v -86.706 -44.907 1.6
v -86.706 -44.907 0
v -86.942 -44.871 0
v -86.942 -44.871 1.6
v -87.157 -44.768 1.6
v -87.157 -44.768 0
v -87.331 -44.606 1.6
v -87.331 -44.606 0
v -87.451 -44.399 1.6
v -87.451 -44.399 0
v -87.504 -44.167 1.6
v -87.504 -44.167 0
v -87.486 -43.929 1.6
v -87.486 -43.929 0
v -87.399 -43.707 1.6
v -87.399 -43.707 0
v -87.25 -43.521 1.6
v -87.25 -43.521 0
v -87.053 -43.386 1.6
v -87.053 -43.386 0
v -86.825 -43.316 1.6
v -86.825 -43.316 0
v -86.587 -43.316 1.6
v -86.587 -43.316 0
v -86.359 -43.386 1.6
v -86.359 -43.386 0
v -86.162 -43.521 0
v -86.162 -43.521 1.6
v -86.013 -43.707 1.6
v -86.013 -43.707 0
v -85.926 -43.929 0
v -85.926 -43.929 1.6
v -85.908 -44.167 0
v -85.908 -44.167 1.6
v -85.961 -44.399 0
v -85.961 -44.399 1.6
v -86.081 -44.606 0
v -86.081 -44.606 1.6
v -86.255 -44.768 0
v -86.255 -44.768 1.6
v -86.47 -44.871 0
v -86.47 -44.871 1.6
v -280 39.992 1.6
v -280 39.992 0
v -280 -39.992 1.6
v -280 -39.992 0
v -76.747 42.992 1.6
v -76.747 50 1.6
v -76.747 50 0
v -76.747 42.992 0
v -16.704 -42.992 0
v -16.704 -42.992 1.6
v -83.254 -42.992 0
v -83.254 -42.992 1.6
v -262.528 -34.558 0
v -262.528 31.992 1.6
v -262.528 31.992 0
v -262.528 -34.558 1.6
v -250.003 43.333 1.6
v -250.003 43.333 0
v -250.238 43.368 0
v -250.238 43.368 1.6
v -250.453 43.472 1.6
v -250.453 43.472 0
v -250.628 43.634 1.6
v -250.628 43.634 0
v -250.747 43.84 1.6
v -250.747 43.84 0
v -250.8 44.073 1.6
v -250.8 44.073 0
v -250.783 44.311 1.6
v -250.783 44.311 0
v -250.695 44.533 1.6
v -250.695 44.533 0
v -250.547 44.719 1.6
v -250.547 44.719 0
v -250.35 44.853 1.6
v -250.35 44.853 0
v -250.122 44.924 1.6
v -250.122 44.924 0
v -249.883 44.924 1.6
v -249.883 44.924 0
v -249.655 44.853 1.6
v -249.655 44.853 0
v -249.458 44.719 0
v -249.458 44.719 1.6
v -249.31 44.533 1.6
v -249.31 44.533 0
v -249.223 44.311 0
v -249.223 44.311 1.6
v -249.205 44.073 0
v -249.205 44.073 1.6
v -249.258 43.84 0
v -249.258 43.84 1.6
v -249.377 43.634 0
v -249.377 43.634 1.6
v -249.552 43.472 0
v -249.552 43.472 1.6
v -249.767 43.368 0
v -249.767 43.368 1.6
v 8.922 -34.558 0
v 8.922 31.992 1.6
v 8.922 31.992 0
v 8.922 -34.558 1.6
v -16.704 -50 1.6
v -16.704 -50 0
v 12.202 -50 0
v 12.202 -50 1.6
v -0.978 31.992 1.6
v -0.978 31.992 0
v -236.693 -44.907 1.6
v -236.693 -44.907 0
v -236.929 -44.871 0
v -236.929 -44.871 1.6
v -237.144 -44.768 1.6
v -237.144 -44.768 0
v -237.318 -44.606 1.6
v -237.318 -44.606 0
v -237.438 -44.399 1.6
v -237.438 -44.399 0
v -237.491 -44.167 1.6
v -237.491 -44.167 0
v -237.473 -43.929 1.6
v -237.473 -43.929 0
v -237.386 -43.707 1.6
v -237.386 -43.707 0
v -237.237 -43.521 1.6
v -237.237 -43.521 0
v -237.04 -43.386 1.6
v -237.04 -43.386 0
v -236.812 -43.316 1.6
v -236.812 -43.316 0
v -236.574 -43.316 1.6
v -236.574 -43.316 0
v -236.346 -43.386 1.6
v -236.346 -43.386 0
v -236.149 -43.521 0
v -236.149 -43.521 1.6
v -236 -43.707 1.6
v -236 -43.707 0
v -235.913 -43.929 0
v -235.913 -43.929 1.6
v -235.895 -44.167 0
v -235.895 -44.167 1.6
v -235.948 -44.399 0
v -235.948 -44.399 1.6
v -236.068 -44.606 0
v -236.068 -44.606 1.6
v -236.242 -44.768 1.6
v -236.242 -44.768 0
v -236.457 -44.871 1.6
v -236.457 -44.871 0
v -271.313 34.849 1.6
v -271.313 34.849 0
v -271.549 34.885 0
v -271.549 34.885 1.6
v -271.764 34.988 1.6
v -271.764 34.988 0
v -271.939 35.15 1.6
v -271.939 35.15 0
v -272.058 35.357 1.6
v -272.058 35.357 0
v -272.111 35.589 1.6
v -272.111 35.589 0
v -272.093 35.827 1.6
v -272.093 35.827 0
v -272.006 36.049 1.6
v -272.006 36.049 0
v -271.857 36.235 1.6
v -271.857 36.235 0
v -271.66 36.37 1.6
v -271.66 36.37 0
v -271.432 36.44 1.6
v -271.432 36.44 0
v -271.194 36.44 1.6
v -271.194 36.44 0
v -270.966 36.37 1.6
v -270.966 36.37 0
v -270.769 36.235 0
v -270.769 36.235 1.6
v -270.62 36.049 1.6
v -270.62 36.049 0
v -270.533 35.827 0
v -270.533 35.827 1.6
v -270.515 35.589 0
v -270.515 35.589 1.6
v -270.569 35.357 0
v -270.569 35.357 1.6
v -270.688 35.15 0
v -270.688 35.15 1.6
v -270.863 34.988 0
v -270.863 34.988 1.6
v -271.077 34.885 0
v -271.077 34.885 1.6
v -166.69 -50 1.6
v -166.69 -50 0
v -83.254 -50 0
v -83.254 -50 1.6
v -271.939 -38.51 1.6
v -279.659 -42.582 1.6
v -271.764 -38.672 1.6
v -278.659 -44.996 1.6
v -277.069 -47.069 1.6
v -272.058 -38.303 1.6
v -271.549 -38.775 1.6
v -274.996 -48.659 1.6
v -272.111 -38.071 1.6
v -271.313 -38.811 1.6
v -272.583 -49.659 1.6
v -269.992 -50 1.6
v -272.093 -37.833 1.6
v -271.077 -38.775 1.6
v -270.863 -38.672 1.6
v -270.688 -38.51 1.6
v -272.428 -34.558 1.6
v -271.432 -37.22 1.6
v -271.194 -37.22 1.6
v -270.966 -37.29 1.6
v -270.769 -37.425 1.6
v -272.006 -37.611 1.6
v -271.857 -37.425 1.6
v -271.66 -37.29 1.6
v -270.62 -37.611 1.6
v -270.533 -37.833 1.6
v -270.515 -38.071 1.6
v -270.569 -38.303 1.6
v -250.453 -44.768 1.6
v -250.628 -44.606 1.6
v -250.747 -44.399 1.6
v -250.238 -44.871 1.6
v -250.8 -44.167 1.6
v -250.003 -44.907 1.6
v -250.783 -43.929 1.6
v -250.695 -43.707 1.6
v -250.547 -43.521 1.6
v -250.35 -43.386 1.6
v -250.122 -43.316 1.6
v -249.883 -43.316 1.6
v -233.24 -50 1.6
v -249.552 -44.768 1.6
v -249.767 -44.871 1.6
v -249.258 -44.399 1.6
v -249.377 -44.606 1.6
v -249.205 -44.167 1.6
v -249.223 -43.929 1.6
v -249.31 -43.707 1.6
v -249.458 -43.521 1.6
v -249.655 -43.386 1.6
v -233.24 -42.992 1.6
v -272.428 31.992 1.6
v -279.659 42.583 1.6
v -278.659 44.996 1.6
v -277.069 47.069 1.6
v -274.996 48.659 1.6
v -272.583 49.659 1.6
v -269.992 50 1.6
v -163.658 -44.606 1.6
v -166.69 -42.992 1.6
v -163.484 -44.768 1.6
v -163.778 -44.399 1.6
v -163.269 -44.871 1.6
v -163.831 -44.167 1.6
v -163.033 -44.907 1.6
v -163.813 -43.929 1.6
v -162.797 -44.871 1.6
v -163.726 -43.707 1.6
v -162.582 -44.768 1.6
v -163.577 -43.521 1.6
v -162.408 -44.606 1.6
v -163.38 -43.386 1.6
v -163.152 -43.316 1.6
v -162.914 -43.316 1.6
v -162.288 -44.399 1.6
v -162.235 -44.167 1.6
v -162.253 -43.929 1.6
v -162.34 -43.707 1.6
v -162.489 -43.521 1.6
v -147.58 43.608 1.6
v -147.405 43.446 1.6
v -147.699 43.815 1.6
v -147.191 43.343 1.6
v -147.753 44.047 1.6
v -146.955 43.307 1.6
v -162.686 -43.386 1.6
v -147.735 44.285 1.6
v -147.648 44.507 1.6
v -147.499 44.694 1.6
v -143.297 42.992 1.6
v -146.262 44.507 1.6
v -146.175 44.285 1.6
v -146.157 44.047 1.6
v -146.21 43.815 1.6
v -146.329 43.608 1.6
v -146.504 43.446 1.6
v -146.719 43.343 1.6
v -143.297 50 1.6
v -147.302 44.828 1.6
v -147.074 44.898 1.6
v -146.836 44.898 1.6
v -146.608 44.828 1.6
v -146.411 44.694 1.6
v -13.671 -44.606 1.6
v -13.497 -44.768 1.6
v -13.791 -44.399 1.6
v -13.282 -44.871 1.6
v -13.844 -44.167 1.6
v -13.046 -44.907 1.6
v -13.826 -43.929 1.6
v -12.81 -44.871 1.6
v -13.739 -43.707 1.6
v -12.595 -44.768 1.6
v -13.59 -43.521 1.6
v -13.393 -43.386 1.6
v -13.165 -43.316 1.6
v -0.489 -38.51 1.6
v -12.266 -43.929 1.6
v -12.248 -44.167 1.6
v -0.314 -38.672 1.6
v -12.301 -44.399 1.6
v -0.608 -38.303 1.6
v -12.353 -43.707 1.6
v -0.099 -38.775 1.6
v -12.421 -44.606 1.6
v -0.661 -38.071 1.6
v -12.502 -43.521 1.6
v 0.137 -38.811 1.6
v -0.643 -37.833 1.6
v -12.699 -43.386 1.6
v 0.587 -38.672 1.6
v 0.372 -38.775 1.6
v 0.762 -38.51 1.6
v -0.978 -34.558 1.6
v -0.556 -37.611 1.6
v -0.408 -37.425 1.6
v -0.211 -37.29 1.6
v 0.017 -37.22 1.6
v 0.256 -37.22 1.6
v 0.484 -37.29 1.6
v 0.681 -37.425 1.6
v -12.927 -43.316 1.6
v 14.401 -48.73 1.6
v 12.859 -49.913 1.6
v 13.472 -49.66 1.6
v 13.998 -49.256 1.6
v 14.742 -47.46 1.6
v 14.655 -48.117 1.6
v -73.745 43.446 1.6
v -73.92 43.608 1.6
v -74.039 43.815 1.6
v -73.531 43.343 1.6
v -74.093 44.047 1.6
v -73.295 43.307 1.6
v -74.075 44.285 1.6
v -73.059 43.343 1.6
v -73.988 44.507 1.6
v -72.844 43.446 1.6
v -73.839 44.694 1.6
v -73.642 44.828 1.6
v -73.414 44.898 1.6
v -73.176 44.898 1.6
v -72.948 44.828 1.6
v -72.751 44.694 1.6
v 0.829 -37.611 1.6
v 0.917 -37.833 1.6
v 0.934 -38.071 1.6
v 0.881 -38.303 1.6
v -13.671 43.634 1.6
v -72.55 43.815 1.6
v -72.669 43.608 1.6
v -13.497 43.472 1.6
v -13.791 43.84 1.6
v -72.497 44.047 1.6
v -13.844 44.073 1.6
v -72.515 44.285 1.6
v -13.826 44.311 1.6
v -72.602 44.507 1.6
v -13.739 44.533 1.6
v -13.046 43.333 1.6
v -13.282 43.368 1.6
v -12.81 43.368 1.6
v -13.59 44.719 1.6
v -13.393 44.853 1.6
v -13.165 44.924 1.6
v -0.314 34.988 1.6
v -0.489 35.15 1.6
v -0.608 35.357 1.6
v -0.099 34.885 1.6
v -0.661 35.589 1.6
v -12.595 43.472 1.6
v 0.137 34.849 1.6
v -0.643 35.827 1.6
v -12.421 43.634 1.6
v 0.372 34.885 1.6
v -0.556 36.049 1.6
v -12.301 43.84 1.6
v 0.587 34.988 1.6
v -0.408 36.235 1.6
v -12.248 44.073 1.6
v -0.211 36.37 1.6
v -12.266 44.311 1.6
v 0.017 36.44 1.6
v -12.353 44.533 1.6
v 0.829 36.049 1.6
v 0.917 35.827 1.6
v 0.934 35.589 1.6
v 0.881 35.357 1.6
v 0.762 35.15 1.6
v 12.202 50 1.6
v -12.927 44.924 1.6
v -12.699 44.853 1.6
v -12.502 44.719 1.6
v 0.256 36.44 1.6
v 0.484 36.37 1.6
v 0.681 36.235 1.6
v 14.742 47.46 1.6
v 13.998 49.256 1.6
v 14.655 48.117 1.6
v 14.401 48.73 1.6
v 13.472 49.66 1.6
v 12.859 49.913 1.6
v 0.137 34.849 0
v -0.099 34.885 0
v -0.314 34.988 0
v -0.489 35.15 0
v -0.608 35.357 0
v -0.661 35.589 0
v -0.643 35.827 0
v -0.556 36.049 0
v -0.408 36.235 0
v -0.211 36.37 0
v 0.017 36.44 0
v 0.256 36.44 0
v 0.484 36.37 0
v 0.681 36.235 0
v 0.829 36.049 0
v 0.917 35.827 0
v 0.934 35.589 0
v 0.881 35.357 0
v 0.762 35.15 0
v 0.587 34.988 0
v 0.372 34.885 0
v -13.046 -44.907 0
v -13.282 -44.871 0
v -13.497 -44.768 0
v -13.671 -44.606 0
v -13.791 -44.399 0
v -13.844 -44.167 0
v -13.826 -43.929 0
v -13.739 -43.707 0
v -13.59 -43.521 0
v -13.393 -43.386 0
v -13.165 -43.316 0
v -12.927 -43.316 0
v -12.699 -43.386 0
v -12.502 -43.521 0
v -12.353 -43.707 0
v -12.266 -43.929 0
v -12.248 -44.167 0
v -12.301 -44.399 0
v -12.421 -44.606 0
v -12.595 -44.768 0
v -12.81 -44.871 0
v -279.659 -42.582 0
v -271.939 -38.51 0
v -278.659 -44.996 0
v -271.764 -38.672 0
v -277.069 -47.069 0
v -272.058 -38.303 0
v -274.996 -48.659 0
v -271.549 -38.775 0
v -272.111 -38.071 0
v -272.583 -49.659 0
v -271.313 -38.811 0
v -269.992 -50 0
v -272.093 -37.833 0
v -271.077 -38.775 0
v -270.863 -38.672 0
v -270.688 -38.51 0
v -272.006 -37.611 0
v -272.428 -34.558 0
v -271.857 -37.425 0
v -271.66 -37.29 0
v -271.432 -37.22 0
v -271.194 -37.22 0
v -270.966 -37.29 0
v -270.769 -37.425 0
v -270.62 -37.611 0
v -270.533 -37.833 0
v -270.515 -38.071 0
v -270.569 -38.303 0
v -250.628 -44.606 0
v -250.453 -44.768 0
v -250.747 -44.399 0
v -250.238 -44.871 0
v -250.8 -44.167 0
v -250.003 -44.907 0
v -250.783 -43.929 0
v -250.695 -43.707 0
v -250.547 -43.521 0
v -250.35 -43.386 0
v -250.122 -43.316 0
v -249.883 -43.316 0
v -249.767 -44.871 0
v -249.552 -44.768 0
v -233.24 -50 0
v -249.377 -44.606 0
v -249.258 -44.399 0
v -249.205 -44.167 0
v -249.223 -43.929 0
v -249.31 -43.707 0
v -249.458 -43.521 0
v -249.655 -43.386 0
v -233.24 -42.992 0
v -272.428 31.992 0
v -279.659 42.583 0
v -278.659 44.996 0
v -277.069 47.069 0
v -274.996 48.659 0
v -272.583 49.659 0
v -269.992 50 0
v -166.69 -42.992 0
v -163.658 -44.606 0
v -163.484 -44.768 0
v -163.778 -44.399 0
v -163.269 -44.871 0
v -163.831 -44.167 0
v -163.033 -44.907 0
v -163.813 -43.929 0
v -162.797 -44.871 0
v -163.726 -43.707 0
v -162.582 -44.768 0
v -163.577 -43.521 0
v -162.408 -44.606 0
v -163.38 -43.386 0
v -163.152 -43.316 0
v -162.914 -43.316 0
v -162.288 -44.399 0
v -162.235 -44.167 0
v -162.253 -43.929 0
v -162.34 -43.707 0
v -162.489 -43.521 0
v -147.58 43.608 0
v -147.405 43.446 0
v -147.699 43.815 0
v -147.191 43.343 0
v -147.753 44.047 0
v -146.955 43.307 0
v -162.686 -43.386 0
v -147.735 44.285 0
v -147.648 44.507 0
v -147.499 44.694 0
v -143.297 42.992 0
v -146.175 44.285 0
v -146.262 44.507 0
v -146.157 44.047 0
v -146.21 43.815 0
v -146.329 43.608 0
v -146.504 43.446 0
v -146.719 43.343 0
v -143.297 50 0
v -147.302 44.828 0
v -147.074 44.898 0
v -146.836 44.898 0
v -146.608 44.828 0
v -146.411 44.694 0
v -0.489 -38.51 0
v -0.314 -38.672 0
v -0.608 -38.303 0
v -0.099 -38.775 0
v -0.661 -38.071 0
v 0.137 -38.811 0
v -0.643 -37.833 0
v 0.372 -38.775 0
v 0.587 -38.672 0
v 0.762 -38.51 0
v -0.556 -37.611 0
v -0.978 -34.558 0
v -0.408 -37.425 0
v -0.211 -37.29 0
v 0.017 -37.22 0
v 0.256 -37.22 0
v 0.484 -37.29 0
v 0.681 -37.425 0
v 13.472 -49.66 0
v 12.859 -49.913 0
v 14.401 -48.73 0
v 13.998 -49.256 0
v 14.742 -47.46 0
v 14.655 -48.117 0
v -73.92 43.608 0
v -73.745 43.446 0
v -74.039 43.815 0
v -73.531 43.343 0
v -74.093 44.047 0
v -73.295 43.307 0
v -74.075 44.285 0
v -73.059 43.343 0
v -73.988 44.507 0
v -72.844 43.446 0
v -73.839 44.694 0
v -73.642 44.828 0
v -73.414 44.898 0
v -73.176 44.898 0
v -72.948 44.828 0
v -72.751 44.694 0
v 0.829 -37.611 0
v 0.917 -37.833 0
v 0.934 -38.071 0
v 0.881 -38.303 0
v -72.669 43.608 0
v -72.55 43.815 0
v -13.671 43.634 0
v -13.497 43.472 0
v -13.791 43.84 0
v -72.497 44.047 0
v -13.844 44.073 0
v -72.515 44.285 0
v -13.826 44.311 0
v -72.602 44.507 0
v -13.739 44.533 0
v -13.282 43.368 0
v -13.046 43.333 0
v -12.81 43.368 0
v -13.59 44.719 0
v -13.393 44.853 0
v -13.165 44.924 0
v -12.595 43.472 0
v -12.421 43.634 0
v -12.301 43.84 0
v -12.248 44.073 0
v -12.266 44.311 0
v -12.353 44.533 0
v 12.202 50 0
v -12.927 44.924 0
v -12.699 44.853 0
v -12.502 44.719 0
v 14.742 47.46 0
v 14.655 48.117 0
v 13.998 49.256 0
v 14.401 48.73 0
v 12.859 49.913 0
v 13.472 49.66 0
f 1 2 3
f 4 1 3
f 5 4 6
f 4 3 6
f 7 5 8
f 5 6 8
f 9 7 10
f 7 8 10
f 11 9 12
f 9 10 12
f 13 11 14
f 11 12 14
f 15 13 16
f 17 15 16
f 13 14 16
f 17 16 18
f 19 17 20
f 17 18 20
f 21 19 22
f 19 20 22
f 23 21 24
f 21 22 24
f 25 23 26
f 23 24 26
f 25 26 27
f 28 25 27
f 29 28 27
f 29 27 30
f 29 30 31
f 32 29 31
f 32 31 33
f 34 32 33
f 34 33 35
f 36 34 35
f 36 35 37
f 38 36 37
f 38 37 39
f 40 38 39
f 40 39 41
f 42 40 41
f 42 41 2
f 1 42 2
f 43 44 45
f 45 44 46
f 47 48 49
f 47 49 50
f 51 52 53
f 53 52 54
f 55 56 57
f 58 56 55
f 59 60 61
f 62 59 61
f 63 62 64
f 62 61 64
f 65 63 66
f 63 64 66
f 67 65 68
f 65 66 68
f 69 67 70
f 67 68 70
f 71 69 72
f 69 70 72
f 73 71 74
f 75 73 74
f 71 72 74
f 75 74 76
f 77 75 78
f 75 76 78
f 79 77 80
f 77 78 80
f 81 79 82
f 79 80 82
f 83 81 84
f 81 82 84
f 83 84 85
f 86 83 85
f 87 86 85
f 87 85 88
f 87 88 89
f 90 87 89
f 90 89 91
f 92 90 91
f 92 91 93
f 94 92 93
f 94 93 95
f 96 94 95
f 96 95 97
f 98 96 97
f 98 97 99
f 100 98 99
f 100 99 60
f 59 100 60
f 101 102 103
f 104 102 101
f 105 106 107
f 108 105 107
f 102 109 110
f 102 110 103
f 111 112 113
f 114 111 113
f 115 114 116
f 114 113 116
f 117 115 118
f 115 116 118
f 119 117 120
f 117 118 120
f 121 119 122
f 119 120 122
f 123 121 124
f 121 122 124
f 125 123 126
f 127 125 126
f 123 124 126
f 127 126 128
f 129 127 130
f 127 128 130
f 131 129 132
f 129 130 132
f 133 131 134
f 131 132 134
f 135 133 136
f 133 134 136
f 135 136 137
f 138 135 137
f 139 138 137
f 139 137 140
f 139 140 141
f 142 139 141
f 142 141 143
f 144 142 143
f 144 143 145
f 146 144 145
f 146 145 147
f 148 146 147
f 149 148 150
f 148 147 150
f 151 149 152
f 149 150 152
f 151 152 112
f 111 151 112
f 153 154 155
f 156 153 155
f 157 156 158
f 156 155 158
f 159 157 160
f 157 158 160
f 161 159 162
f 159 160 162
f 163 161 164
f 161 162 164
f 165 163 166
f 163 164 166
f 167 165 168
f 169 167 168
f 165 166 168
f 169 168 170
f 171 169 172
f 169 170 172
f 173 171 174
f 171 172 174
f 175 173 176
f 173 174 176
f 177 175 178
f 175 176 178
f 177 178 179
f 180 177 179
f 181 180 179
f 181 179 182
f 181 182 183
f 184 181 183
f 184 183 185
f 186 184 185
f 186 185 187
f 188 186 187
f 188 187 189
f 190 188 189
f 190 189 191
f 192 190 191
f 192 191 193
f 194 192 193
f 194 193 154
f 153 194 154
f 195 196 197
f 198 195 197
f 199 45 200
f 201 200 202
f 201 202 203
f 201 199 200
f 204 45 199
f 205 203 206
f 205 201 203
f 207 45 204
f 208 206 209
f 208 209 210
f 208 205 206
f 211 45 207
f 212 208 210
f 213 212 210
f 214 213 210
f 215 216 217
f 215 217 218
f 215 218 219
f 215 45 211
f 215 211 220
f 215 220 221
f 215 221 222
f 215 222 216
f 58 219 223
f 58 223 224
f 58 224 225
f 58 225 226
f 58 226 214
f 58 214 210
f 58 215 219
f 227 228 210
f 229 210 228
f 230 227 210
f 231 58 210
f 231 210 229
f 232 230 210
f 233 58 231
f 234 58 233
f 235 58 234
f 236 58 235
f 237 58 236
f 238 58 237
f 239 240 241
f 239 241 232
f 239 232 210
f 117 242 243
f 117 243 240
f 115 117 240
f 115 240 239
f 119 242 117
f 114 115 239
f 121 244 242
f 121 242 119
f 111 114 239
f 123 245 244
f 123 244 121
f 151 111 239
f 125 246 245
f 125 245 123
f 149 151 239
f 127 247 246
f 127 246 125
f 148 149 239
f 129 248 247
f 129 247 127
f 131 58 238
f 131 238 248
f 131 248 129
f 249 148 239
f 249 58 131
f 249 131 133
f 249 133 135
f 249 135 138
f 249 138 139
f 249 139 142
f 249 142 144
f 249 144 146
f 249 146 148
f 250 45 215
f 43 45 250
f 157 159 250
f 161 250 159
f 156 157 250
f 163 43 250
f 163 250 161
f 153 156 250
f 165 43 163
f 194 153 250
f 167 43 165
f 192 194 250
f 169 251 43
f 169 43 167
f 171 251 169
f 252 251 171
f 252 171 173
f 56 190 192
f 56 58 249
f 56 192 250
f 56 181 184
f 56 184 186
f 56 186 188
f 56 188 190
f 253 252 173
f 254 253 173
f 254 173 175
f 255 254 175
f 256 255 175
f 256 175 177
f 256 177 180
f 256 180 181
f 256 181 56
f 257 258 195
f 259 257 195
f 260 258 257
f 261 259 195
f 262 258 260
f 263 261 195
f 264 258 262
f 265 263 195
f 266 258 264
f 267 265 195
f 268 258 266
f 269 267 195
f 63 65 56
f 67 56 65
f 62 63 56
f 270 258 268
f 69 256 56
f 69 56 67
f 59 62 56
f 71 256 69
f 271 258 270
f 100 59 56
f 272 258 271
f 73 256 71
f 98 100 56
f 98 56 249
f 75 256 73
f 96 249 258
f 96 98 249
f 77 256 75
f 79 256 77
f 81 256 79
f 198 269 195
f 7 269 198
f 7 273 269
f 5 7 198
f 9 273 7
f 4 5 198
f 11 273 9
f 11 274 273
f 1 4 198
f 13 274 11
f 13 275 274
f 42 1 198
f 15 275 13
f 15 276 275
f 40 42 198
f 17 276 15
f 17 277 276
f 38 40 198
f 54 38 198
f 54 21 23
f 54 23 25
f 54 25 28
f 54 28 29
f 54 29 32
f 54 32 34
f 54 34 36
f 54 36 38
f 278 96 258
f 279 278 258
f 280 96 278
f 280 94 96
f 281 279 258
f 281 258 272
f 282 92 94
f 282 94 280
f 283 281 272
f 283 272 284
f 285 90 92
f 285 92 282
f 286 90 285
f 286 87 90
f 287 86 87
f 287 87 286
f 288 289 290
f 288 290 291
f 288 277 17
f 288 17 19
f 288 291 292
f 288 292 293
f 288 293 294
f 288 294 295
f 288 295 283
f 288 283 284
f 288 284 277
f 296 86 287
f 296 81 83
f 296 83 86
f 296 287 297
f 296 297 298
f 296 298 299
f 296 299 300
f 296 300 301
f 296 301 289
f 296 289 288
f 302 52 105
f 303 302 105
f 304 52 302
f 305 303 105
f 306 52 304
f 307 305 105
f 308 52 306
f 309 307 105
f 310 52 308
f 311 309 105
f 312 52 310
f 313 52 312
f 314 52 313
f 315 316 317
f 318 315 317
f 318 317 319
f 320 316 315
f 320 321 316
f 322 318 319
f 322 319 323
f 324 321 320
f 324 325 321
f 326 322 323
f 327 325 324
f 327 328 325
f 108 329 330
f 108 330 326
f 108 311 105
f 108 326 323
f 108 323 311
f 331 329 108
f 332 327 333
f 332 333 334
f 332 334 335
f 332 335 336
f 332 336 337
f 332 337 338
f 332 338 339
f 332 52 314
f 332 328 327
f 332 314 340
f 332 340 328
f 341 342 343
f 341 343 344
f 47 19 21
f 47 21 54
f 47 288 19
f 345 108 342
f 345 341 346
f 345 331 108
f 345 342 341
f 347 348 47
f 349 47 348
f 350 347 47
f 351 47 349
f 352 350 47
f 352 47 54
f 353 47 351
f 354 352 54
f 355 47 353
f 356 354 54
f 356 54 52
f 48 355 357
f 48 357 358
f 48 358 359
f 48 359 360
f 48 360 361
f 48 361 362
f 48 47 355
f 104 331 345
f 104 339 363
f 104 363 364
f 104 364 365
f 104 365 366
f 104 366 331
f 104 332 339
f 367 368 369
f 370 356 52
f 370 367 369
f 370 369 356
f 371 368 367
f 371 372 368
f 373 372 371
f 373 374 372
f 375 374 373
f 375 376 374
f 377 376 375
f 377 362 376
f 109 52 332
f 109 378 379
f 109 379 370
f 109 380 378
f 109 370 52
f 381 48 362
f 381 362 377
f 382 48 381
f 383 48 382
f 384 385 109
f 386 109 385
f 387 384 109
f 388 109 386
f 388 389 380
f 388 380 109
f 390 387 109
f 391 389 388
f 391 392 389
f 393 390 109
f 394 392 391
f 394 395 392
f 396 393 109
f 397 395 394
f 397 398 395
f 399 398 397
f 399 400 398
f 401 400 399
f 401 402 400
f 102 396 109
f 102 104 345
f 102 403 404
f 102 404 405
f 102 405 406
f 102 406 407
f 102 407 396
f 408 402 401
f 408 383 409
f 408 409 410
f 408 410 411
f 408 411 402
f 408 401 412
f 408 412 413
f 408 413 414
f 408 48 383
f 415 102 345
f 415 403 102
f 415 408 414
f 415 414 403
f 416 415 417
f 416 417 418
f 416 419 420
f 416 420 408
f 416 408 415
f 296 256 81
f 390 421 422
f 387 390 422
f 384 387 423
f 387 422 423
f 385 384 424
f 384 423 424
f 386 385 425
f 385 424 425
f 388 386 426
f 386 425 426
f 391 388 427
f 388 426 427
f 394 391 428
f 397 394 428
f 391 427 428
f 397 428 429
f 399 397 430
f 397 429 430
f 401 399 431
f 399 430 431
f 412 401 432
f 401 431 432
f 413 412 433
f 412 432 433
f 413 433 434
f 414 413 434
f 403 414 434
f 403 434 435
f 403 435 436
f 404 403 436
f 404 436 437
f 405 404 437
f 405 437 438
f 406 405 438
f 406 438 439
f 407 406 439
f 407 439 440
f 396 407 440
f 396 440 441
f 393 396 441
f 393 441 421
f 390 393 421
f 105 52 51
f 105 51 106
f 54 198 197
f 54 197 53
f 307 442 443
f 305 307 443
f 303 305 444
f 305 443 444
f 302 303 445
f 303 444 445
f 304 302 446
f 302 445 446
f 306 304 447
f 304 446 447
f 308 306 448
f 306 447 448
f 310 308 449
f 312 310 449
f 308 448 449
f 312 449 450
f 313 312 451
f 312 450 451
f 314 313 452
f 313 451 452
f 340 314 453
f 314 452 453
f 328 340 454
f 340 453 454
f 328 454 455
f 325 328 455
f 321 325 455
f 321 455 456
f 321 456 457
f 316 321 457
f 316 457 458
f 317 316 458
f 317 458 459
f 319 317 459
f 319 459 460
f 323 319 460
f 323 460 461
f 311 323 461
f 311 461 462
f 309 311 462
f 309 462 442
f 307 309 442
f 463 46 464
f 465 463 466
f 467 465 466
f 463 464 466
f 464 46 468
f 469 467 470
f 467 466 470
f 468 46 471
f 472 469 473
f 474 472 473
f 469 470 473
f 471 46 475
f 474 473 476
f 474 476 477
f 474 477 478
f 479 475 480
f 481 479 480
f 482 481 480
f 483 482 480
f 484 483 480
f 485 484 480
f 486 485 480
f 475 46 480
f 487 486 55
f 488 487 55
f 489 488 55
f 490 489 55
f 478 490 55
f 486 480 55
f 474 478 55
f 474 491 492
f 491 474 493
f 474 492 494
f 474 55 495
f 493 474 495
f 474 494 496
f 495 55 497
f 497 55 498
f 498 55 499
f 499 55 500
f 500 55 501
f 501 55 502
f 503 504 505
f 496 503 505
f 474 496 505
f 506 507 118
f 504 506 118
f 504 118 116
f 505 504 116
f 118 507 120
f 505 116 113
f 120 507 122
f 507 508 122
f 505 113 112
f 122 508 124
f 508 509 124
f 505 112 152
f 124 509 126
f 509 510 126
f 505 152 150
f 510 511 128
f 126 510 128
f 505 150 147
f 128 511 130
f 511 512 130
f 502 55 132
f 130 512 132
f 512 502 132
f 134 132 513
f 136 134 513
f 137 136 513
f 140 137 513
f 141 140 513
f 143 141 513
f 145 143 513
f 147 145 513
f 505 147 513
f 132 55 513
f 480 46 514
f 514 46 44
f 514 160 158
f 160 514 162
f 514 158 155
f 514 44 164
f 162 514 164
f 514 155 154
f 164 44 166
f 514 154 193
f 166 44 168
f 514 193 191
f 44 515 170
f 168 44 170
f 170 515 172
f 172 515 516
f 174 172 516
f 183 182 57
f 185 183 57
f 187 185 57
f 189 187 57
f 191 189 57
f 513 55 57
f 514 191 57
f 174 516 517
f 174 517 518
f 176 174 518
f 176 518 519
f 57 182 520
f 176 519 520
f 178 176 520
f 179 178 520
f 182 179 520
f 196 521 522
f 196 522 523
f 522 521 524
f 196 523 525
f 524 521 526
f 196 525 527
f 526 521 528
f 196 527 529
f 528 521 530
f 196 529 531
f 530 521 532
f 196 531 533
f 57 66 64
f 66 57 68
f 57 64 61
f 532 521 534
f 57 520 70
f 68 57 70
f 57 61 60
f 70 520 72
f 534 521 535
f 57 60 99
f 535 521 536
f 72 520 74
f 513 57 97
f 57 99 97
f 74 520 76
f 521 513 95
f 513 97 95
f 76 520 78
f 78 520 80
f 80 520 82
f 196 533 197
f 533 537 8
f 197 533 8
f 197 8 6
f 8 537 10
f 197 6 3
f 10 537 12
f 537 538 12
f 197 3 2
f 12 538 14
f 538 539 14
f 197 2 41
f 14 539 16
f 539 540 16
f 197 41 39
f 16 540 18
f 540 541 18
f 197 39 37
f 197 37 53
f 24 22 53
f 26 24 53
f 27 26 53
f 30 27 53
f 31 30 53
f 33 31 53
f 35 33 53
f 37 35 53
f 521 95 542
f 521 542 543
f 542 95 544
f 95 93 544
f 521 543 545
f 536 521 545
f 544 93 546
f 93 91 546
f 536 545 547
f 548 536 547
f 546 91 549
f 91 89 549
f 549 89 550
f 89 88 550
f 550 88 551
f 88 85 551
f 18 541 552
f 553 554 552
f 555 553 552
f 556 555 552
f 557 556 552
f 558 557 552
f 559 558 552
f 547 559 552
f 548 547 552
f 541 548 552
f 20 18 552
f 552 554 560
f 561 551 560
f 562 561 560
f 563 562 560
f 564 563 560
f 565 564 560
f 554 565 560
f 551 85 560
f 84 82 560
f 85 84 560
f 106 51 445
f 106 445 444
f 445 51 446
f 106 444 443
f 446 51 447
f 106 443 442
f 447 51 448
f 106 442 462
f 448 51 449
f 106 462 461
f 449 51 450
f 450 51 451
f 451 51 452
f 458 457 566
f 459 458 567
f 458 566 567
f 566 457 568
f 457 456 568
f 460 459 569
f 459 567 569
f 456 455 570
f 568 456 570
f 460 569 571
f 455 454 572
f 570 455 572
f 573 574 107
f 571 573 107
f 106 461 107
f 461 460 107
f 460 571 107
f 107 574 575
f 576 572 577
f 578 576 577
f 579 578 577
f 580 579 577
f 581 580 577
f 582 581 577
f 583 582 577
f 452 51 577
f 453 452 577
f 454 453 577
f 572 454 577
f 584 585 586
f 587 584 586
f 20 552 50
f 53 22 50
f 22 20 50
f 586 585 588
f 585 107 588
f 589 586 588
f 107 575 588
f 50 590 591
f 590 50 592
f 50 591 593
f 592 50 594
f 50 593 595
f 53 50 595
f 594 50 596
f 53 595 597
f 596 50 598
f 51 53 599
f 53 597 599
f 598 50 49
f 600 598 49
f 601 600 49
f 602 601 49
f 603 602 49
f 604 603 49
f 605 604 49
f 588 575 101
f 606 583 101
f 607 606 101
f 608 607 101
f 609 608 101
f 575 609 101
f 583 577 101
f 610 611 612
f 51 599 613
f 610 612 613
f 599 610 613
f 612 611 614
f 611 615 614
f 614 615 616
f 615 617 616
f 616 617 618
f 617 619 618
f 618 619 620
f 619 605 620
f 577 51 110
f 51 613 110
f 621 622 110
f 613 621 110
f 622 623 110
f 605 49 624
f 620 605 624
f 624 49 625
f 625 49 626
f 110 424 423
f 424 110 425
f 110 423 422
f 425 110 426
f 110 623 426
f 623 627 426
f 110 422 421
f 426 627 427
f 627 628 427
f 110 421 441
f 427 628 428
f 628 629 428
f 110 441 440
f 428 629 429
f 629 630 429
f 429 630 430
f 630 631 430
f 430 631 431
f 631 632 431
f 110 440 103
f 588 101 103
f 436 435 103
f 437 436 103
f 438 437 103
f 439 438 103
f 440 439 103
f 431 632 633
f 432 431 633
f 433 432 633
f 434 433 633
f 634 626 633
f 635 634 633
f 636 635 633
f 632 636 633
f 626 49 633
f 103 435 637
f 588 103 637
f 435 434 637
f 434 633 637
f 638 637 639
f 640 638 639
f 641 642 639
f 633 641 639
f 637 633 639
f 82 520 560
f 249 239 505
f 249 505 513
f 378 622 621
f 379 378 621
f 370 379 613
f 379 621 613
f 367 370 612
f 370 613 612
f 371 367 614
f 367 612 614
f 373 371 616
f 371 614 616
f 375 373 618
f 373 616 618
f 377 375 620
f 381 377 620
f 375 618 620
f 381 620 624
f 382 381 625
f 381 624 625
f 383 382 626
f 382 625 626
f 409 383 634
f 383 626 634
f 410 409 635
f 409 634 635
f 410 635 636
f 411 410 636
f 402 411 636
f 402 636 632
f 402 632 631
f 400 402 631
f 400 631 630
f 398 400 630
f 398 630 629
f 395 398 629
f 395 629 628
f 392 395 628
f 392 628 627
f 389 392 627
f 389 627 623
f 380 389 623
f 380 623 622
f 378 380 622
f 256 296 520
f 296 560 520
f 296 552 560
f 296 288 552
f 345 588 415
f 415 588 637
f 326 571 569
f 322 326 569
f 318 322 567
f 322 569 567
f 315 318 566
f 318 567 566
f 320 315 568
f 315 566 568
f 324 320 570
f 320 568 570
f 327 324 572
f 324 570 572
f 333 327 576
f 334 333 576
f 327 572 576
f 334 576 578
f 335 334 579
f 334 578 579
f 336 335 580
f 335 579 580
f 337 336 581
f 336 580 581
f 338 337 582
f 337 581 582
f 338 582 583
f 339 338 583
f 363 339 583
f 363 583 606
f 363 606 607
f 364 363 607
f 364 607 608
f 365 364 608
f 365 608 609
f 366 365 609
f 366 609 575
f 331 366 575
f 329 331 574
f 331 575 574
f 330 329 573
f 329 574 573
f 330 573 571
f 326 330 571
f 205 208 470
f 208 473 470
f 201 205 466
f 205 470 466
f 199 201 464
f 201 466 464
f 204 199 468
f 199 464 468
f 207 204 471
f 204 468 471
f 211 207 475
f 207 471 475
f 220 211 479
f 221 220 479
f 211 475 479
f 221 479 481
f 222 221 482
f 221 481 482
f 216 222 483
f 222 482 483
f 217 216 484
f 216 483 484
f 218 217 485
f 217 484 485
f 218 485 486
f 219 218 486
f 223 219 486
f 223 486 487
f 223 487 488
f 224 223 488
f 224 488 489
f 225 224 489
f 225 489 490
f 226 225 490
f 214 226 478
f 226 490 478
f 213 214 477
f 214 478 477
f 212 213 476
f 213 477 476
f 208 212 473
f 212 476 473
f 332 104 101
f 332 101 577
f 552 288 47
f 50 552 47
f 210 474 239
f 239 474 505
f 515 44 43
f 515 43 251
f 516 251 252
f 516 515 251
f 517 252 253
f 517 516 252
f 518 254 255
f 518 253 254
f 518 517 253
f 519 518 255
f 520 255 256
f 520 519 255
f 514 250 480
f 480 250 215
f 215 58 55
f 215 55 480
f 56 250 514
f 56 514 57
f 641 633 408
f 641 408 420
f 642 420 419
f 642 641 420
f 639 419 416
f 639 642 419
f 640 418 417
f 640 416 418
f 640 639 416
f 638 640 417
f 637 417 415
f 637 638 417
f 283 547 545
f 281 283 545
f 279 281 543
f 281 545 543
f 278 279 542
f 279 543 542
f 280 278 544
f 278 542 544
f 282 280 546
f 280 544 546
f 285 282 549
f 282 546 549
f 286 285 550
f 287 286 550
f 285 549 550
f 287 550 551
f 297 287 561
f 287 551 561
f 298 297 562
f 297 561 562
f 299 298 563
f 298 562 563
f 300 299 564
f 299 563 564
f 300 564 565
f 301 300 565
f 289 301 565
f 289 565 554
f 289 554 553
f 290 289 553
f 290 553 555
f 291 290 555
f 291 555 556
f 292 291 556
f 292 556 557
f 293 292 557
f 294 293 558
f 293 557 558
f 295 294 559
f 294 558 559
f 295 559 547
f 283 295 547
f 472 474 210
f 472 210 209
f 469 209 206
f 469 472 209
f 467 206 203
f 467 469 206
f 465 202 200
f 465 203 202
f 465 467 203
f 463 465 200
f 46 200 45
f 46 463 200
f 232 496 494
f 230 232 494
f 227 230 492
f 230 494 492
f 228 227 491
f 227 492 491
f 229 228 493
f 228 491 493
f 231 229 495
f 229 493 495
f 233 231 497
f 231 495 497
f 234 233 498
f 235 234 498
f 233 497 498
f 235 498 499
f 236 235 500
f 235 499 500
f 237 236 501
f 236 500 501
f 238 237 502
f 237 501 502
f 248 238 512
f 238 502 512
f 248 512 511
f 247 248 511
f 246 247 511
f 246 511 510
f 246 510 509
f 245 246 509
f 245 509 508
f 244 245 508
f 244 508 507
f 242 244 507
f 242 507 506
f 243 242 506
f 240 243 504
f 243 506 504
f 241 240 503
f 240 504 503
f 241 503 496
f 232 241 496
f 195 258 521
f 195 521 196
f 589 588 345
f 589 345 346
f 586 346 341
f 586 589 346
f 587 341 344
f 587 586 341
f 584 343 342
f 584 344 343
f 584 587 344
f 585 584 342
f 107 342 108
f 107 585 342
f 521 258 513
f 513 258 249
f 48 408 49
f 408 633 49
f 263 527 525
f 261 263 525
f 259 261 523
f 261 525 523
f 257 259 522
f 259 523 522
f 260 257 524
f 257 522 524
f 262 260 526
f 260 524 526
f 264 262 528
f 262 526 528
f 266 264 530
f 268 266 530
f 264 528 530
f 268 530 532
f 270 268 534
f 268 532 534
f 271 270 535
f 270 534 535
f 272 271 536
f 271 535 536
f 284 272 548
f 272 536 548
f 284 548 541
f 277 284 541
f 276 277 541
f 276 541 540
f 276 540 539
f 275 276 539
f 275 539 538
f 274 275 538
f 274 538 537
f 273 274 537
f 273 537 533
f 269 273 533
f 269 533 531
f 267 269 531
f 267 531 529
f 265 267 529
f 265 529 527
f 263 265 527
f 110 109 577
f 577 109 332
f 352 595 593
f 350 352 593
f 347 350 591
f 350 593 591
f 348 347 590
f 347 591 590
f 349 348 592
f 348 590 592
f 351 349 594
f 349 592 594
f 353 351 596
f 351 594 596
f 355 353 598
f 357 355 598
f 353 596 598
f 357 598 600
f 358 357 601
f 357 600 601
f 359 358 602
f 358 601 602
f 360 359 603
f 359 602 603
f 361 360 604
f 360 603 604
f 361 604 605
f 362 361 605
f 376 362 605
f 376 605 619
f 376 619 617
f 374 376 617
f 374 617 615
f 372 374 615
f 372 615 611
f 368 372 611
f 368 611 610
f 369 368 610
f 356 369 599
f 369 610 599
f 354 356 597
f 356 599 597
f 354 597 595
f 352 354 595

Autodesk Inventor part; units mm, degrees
ref_plane "YZ Plane" through (0, 0, 0) normal (1, 0, 0) x (0, 1, 0)
ref_plane "XZ Plane" through (0, 0, 0) normal (0, 1, 0) x (-1, 0, 0)
ref_plane "XY Plane" through (0, 0, 0) normal (0, 0, 1) x (1, 0, 0)
ref_plane "Work Plane1" through (0, 0, 0) normal (0, 0, 1) x (1, 0, 0)
sketch "Sketch1" plane through (0, 0, 0) normal (0, 0, 1) x (1, 0, 0)
  line L0 (14.7416, 30.2896) -> (14.7416, 47.46) projected
  line L1 (14.7416, 29.7816) -> (14.7416, 30.2896) projected
  line L2 (14.7416, -47.4598) -> (14.7416, 29.7816) projected
  arc A0 (14.7416, 47.46) -> (12.2016, 50) centre (12.2016, 47.46) ccw projected
  line L3 (12.2016, 50) -> (-68.0116, 50) projected
  arc A1 (12.2016, -49.9998) -> (14.7416, -47.4598) centre (12.2016, -47.4598) ccw projected
  line L4 (-6.315, -49.9998) -> (12.2016, -49.9998) projected
  line L5 (-157.7498, -49.9998) -> (-92.5988, -49.9998) projected
  line L6 (-269.9924, -49.9998) -> (-263.9218, -49.9998) projected
  line L7 (-263.9218, -49.9998) -> (-241.9762, -49.9998) projected
  arc A2 (-280, -39.9922) -> (-269.9924, -49.9998) centre (-269.9924, -39.9922) ccw projected
  line L8 (-280, 39.2304) -> (-280, -39.9922) projected
  arc A3 (-269.9924, 50) -> (-280, 39.9924) centre (-269.9924, 39.9924) ccw projected
  line L9 (-280, 39.9924) -> (-280, 39.2304) projected
  line L10 (-263.4646, 50) -> (-269.9924, 50) projected
  line L11 (-152.238, 50) -> (-263.4646, 50) projected
  line L12 (-152.238, 50) -> (-68.0116, 50)
  line L13 (-92.5988, -49.9998) -> (-6.315, -49.9998)
  line L14 (-157.7498, -49.9998) -> (-241.9762, -49.9998)
  point P0 (0, 0)
extrude "Extrusion1" add sketch "Sketch1" along normal blind 1.6
sketch "Sketch2" plane through (0, 0, 1.6) normal (0, 0, 1) x (1, 0, 0)
  circle A0 centre (0.1366, 35.649) radius 1.75 projected
  circle A1 centre (-13.046, 44.1326) radius 1.75 projected
  circle A2 centre (0.1366, -38.011) radius 1.75 projected
  circle A3 centre (-13.046, -44.107) radius 1.75 projected
  circle A4 centre (-73.2948, 44.1072) radius 1.75 projected
  circle A5 centre (-86.706, -44.107) radius 1.75 projected
  circle A6 centre (-146.9548, 44.1072) radius 1.75 projected
  circle A7 centre (-163.033, -44.107) radius 1.75 projected
  circle A8 centre (-250.0026, -44.107) radius 1.75 projected
  circle A9 centre (-271.3132, -38.011) radius 1.75 projected
  circle A10 centre (-236.693, -44.107) radius 1.75 projected
  circle A11 centre (-271.3132, 35.649) radius 1.75 projected
  circle A12 centre (-250.0026, 44.1326) radius 1.75 projected
  point P0 (0, 0)
hole "Hole1" at (0.1366, 35.649, 1.6) at (-13.046, 44.1326, 1.6) at (0.1366, -38.011, 1.6) at (-13.046, -44.107, 1.6) at (-86.706, -44.107, 1.6) at (-146.9548, 44.1072, 1.6) at (-163.033, -44.107, 1.6) at (-236.693, -44.107, 1.6) at (-250.0026, -44.107, 1.6) at (-271.3132, -38.011, 1.6) at (-271.3132, 35.649, 1.6) at (-250.0026, 44.1326, 1.6) at (-73.2948, 44.1072, 1.6) direction (0, 0, -1) diameter 1.6 depth 5 tip angle 118
sketch "Sketch3" plane through (0, 0, 1.6) normal (0, 0, 1) x (1, 0, 0)
  line L0 (8.922, 31.9915) -> (8.922, -34.5585) projected
  line L1 (-0.978, 31.9915) -> (8.922, 31.9915) projected
  line L2 (-0.978, 31.9915) -> (-0.978, -34.5585) projected
  line L3 (8.922, -34.5585) -> (-0.978, -34.5585) projected
  line L4 (-76.7473, 52.8925) -> (-76.7473, 42.9925) projected
  line L5 (-143.2973, 52.8925) -> (-76.7473, 52.8925) projected
  line L6 (-143.2973, 42.9925) -> (-76.7473, 42.9925) projected
  line L7 (-143.2973, 42.9925) -> (-143.2973, 52.8925) projected
  line L8 (-16.7036, -42.9923) -> (-16.7036, -52.8923) projected
  line L9 (-16.7036, -52.8923) -> (-83.2536, -52.8923) projected
  line L10 (-16.7036, -42.9923) -> (-83.2536, -42.9923) projected
  line L11 (-83.2536, -52.8923) -> (-83.2536, -42.9923) projected
  line L12 (-166.6905, -42.9923) -> (-233.2405, -42.9923) projected
  line L13 (-166.6905, -52.8923) -> (-233.2405, -52.8923) projected
  line L14 (-233.2405, -52.8923) -> (-233.2405, -42.9923) projected
  line L15 (-166.6905, -42.9923) -> (-166.6905, -52.8923) projected
  line L16 (-262.5279, 31.9915) -> (-262.5279, -34.5585) projected
  line L17 (-272.4279, 31.9915) -> (-262.5279, 31.9915) projected
  line L18 (-272.4279, 31.9915) -> (-272.4279, -34.5585) projected
  line L19 (-262.5279, -34.5585) -> (-272.4279, -34.5585) projected
  point P0 (0, 0)
extrude "Extrusion2" cut sketch "Sketch3" against normal blind 1.6
properties part number "Spacing Layer 4"
